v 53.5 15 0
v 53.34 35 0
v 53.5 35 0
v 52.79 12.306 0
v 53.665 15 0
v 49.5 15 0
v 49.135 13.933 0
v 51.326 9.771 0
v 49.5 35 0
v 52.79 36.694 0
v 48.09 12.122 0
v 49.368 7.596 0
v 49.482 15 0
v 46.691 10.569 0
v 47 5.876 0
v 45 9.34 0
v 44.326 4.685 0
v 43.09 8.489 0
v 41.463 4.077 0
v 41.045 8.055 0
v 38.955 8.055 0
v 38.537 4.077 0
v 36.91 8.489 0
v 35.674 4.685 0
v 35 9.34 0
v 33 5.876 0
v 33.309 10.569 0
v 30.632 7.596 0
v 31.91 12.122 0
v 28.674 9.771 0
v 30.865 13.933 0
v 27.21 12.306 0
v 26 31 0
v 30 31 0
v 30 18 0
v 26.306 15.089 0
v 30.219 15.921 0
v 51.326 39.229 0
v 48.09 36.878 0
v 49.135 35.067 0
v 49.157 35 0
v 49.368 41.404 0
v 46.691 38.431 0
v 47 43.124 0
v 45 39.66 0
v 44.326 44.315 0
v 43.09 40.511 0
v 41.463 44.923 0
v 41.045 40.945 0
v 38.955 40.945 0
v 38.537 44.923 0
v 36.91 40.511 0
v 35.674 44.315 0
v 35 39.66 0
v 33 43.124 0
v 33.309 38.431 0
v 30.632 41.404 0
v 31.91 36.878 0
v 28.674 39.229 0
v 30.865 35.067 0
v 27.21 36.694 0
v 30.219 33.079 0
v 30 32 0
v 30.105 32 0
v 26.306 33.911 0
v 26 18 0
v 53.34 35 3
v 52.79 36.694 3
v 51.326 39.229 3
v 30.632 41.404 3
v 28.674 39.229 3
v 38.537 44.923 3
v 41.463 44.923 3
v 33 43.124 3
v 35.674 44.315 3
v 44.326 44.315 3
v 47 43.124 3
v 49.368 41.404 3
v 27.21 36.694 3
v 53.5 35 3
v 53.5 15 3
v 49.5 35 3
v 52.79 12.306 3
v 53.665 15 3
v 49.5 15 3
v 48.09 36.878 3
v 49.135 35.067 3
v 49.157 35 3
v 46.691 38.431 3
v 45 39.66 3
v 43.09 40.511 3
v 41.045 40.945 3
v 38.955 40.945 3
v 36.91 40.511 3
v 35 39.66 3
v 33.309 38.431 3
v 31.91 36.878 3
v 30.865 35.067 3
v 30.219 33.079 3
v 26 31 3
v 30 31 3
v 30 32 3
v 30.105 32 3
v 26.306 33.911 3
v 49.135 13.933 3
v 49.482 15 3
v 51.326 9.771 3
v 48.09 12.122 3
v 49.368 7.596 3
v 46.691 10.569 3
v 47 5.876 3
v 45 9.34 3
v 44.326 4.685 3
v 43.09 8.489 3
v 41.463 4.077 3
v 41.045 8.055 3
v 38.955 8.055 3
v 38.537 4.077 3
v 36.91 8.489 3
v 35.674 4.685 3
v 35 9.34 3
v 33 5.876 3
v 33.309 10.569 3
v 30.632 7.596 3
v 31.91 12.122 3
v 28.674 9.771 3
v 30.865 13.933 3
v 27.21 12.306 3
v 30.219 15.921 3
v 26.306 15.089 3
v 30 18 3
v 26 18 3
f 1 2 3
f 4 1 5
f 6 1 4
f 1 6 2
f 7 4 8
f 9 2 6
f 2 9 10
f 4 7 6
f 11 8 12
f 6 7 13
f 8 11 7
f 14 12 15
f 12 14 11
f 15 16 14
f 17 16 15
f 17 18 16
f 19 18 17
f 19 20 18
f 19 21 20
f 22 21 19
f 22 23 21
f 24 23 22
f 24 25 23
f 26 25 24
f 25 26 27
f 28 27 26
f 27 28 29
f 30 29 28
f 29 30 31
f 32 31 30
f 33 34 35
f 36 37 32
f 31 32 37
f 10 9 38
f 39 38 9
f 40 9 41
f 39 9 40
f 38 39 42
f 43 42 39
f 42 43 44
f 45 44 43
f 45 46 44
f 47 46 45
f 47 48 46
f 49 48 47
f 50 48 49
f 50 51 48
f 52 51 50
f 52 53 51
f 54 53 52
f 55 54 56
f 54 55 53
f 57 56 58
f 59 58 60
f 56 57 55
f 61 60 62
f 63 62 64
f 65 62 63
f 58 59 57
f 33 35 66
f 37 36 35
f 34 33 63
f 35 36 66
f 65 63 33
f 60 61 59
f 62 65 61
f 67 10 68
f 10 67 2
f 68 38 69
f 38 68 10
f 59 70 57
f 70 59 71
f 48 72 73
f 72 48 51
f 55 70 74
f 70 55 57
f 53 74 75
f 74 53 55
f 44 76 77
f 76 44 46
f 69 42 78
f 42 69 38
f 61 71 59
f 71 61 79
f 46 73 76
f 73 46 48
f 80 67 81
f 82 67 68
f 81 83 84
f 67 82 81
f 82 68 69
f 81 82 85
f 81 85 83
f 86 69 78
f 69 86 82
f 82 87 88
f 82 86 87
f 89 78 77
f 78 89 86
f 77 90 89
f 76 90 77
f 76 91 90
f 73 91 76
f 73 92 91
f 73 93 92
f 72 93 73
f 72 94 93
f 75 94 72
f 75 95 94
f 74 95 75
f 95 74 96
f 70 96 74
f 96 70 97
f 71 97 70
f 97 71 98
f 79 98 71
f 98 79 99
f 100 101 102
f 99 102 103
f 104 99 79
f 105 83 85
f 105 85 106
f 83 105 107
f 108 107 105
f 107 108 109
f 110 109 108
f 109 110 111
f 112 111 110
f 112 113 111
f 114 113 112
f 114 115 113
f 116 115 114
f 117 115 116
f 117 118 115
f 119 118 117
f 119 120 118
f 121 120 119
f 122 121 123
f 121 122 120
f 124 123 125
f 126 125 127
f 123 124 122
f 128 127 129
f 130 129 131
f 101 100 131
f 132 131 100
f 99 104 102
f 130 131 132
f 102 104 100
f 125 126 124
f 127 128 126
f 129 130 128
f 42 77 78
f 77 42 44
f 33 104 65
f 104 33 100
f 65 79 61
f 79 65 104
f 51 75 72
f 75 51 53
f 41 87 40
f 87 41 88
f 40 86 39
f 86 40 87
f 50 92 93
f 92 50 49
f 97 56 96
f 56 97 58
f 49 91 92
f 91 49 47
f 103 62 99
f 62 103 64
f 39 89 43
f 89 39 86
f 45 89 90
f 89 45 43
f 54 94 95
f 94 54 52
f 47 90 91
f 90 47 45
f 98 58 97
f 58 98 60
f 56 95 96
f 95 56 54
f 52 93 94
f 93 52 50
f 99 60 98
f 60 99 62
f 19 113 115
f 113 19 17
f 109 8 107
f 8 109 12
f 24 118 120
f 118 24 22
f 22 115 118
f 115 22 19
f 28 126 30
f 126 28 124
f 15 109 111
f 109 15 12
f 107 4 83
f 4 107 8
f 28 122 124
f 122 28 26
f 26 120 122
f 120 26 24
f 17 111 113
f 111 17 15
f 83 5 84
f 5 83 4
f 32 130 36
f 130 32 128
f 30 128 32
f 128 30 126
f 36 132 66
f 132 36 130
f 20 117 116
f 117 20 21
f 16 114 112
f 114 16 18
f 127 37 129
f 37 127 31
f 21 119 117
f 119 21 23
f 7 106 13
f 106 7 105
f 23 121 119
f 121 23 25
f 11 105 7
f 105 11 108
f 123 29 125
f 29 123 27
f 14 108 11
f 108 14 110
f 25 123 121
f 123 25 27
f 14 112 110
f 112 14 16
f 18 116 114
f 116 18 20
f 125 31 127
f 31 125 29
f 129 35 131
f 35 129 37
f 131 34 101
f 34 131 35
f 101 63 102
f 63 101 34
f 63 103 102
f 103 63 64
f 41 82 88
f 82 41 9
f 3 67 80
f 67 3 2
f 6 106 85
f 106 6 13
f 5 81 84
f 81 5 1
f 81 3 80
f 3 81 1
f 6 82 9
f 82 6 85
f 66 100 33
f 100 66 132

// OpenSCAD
// буква О
translate([0,5,0])
union(){
  translate([49.5,10,0]) cube([4,20,3]);
  translate([26,13,0]) cube([4,13,3]);
difference(){
union(){
	
  difference(){
  translate([40,26,0]) cylinder(3,14,14);
  translate([40,26,-1]) cylinder(5,10,10);
  translate([33,10,-1]) cube([20,10,5]);

}

difference(){
  translate([40,13,0]) cylinder(3,14,14);
  translate([40,13,-1]) cylinder(5,10,10);
  translate([32,17,-1]) cube([19,10,5]);
  translate([40,17,-1]) cube(20);
}
}
  translate([30,13,-1]) cube([5,14,5]);
  translate([42,10,-1]) cube(20);
}
}
